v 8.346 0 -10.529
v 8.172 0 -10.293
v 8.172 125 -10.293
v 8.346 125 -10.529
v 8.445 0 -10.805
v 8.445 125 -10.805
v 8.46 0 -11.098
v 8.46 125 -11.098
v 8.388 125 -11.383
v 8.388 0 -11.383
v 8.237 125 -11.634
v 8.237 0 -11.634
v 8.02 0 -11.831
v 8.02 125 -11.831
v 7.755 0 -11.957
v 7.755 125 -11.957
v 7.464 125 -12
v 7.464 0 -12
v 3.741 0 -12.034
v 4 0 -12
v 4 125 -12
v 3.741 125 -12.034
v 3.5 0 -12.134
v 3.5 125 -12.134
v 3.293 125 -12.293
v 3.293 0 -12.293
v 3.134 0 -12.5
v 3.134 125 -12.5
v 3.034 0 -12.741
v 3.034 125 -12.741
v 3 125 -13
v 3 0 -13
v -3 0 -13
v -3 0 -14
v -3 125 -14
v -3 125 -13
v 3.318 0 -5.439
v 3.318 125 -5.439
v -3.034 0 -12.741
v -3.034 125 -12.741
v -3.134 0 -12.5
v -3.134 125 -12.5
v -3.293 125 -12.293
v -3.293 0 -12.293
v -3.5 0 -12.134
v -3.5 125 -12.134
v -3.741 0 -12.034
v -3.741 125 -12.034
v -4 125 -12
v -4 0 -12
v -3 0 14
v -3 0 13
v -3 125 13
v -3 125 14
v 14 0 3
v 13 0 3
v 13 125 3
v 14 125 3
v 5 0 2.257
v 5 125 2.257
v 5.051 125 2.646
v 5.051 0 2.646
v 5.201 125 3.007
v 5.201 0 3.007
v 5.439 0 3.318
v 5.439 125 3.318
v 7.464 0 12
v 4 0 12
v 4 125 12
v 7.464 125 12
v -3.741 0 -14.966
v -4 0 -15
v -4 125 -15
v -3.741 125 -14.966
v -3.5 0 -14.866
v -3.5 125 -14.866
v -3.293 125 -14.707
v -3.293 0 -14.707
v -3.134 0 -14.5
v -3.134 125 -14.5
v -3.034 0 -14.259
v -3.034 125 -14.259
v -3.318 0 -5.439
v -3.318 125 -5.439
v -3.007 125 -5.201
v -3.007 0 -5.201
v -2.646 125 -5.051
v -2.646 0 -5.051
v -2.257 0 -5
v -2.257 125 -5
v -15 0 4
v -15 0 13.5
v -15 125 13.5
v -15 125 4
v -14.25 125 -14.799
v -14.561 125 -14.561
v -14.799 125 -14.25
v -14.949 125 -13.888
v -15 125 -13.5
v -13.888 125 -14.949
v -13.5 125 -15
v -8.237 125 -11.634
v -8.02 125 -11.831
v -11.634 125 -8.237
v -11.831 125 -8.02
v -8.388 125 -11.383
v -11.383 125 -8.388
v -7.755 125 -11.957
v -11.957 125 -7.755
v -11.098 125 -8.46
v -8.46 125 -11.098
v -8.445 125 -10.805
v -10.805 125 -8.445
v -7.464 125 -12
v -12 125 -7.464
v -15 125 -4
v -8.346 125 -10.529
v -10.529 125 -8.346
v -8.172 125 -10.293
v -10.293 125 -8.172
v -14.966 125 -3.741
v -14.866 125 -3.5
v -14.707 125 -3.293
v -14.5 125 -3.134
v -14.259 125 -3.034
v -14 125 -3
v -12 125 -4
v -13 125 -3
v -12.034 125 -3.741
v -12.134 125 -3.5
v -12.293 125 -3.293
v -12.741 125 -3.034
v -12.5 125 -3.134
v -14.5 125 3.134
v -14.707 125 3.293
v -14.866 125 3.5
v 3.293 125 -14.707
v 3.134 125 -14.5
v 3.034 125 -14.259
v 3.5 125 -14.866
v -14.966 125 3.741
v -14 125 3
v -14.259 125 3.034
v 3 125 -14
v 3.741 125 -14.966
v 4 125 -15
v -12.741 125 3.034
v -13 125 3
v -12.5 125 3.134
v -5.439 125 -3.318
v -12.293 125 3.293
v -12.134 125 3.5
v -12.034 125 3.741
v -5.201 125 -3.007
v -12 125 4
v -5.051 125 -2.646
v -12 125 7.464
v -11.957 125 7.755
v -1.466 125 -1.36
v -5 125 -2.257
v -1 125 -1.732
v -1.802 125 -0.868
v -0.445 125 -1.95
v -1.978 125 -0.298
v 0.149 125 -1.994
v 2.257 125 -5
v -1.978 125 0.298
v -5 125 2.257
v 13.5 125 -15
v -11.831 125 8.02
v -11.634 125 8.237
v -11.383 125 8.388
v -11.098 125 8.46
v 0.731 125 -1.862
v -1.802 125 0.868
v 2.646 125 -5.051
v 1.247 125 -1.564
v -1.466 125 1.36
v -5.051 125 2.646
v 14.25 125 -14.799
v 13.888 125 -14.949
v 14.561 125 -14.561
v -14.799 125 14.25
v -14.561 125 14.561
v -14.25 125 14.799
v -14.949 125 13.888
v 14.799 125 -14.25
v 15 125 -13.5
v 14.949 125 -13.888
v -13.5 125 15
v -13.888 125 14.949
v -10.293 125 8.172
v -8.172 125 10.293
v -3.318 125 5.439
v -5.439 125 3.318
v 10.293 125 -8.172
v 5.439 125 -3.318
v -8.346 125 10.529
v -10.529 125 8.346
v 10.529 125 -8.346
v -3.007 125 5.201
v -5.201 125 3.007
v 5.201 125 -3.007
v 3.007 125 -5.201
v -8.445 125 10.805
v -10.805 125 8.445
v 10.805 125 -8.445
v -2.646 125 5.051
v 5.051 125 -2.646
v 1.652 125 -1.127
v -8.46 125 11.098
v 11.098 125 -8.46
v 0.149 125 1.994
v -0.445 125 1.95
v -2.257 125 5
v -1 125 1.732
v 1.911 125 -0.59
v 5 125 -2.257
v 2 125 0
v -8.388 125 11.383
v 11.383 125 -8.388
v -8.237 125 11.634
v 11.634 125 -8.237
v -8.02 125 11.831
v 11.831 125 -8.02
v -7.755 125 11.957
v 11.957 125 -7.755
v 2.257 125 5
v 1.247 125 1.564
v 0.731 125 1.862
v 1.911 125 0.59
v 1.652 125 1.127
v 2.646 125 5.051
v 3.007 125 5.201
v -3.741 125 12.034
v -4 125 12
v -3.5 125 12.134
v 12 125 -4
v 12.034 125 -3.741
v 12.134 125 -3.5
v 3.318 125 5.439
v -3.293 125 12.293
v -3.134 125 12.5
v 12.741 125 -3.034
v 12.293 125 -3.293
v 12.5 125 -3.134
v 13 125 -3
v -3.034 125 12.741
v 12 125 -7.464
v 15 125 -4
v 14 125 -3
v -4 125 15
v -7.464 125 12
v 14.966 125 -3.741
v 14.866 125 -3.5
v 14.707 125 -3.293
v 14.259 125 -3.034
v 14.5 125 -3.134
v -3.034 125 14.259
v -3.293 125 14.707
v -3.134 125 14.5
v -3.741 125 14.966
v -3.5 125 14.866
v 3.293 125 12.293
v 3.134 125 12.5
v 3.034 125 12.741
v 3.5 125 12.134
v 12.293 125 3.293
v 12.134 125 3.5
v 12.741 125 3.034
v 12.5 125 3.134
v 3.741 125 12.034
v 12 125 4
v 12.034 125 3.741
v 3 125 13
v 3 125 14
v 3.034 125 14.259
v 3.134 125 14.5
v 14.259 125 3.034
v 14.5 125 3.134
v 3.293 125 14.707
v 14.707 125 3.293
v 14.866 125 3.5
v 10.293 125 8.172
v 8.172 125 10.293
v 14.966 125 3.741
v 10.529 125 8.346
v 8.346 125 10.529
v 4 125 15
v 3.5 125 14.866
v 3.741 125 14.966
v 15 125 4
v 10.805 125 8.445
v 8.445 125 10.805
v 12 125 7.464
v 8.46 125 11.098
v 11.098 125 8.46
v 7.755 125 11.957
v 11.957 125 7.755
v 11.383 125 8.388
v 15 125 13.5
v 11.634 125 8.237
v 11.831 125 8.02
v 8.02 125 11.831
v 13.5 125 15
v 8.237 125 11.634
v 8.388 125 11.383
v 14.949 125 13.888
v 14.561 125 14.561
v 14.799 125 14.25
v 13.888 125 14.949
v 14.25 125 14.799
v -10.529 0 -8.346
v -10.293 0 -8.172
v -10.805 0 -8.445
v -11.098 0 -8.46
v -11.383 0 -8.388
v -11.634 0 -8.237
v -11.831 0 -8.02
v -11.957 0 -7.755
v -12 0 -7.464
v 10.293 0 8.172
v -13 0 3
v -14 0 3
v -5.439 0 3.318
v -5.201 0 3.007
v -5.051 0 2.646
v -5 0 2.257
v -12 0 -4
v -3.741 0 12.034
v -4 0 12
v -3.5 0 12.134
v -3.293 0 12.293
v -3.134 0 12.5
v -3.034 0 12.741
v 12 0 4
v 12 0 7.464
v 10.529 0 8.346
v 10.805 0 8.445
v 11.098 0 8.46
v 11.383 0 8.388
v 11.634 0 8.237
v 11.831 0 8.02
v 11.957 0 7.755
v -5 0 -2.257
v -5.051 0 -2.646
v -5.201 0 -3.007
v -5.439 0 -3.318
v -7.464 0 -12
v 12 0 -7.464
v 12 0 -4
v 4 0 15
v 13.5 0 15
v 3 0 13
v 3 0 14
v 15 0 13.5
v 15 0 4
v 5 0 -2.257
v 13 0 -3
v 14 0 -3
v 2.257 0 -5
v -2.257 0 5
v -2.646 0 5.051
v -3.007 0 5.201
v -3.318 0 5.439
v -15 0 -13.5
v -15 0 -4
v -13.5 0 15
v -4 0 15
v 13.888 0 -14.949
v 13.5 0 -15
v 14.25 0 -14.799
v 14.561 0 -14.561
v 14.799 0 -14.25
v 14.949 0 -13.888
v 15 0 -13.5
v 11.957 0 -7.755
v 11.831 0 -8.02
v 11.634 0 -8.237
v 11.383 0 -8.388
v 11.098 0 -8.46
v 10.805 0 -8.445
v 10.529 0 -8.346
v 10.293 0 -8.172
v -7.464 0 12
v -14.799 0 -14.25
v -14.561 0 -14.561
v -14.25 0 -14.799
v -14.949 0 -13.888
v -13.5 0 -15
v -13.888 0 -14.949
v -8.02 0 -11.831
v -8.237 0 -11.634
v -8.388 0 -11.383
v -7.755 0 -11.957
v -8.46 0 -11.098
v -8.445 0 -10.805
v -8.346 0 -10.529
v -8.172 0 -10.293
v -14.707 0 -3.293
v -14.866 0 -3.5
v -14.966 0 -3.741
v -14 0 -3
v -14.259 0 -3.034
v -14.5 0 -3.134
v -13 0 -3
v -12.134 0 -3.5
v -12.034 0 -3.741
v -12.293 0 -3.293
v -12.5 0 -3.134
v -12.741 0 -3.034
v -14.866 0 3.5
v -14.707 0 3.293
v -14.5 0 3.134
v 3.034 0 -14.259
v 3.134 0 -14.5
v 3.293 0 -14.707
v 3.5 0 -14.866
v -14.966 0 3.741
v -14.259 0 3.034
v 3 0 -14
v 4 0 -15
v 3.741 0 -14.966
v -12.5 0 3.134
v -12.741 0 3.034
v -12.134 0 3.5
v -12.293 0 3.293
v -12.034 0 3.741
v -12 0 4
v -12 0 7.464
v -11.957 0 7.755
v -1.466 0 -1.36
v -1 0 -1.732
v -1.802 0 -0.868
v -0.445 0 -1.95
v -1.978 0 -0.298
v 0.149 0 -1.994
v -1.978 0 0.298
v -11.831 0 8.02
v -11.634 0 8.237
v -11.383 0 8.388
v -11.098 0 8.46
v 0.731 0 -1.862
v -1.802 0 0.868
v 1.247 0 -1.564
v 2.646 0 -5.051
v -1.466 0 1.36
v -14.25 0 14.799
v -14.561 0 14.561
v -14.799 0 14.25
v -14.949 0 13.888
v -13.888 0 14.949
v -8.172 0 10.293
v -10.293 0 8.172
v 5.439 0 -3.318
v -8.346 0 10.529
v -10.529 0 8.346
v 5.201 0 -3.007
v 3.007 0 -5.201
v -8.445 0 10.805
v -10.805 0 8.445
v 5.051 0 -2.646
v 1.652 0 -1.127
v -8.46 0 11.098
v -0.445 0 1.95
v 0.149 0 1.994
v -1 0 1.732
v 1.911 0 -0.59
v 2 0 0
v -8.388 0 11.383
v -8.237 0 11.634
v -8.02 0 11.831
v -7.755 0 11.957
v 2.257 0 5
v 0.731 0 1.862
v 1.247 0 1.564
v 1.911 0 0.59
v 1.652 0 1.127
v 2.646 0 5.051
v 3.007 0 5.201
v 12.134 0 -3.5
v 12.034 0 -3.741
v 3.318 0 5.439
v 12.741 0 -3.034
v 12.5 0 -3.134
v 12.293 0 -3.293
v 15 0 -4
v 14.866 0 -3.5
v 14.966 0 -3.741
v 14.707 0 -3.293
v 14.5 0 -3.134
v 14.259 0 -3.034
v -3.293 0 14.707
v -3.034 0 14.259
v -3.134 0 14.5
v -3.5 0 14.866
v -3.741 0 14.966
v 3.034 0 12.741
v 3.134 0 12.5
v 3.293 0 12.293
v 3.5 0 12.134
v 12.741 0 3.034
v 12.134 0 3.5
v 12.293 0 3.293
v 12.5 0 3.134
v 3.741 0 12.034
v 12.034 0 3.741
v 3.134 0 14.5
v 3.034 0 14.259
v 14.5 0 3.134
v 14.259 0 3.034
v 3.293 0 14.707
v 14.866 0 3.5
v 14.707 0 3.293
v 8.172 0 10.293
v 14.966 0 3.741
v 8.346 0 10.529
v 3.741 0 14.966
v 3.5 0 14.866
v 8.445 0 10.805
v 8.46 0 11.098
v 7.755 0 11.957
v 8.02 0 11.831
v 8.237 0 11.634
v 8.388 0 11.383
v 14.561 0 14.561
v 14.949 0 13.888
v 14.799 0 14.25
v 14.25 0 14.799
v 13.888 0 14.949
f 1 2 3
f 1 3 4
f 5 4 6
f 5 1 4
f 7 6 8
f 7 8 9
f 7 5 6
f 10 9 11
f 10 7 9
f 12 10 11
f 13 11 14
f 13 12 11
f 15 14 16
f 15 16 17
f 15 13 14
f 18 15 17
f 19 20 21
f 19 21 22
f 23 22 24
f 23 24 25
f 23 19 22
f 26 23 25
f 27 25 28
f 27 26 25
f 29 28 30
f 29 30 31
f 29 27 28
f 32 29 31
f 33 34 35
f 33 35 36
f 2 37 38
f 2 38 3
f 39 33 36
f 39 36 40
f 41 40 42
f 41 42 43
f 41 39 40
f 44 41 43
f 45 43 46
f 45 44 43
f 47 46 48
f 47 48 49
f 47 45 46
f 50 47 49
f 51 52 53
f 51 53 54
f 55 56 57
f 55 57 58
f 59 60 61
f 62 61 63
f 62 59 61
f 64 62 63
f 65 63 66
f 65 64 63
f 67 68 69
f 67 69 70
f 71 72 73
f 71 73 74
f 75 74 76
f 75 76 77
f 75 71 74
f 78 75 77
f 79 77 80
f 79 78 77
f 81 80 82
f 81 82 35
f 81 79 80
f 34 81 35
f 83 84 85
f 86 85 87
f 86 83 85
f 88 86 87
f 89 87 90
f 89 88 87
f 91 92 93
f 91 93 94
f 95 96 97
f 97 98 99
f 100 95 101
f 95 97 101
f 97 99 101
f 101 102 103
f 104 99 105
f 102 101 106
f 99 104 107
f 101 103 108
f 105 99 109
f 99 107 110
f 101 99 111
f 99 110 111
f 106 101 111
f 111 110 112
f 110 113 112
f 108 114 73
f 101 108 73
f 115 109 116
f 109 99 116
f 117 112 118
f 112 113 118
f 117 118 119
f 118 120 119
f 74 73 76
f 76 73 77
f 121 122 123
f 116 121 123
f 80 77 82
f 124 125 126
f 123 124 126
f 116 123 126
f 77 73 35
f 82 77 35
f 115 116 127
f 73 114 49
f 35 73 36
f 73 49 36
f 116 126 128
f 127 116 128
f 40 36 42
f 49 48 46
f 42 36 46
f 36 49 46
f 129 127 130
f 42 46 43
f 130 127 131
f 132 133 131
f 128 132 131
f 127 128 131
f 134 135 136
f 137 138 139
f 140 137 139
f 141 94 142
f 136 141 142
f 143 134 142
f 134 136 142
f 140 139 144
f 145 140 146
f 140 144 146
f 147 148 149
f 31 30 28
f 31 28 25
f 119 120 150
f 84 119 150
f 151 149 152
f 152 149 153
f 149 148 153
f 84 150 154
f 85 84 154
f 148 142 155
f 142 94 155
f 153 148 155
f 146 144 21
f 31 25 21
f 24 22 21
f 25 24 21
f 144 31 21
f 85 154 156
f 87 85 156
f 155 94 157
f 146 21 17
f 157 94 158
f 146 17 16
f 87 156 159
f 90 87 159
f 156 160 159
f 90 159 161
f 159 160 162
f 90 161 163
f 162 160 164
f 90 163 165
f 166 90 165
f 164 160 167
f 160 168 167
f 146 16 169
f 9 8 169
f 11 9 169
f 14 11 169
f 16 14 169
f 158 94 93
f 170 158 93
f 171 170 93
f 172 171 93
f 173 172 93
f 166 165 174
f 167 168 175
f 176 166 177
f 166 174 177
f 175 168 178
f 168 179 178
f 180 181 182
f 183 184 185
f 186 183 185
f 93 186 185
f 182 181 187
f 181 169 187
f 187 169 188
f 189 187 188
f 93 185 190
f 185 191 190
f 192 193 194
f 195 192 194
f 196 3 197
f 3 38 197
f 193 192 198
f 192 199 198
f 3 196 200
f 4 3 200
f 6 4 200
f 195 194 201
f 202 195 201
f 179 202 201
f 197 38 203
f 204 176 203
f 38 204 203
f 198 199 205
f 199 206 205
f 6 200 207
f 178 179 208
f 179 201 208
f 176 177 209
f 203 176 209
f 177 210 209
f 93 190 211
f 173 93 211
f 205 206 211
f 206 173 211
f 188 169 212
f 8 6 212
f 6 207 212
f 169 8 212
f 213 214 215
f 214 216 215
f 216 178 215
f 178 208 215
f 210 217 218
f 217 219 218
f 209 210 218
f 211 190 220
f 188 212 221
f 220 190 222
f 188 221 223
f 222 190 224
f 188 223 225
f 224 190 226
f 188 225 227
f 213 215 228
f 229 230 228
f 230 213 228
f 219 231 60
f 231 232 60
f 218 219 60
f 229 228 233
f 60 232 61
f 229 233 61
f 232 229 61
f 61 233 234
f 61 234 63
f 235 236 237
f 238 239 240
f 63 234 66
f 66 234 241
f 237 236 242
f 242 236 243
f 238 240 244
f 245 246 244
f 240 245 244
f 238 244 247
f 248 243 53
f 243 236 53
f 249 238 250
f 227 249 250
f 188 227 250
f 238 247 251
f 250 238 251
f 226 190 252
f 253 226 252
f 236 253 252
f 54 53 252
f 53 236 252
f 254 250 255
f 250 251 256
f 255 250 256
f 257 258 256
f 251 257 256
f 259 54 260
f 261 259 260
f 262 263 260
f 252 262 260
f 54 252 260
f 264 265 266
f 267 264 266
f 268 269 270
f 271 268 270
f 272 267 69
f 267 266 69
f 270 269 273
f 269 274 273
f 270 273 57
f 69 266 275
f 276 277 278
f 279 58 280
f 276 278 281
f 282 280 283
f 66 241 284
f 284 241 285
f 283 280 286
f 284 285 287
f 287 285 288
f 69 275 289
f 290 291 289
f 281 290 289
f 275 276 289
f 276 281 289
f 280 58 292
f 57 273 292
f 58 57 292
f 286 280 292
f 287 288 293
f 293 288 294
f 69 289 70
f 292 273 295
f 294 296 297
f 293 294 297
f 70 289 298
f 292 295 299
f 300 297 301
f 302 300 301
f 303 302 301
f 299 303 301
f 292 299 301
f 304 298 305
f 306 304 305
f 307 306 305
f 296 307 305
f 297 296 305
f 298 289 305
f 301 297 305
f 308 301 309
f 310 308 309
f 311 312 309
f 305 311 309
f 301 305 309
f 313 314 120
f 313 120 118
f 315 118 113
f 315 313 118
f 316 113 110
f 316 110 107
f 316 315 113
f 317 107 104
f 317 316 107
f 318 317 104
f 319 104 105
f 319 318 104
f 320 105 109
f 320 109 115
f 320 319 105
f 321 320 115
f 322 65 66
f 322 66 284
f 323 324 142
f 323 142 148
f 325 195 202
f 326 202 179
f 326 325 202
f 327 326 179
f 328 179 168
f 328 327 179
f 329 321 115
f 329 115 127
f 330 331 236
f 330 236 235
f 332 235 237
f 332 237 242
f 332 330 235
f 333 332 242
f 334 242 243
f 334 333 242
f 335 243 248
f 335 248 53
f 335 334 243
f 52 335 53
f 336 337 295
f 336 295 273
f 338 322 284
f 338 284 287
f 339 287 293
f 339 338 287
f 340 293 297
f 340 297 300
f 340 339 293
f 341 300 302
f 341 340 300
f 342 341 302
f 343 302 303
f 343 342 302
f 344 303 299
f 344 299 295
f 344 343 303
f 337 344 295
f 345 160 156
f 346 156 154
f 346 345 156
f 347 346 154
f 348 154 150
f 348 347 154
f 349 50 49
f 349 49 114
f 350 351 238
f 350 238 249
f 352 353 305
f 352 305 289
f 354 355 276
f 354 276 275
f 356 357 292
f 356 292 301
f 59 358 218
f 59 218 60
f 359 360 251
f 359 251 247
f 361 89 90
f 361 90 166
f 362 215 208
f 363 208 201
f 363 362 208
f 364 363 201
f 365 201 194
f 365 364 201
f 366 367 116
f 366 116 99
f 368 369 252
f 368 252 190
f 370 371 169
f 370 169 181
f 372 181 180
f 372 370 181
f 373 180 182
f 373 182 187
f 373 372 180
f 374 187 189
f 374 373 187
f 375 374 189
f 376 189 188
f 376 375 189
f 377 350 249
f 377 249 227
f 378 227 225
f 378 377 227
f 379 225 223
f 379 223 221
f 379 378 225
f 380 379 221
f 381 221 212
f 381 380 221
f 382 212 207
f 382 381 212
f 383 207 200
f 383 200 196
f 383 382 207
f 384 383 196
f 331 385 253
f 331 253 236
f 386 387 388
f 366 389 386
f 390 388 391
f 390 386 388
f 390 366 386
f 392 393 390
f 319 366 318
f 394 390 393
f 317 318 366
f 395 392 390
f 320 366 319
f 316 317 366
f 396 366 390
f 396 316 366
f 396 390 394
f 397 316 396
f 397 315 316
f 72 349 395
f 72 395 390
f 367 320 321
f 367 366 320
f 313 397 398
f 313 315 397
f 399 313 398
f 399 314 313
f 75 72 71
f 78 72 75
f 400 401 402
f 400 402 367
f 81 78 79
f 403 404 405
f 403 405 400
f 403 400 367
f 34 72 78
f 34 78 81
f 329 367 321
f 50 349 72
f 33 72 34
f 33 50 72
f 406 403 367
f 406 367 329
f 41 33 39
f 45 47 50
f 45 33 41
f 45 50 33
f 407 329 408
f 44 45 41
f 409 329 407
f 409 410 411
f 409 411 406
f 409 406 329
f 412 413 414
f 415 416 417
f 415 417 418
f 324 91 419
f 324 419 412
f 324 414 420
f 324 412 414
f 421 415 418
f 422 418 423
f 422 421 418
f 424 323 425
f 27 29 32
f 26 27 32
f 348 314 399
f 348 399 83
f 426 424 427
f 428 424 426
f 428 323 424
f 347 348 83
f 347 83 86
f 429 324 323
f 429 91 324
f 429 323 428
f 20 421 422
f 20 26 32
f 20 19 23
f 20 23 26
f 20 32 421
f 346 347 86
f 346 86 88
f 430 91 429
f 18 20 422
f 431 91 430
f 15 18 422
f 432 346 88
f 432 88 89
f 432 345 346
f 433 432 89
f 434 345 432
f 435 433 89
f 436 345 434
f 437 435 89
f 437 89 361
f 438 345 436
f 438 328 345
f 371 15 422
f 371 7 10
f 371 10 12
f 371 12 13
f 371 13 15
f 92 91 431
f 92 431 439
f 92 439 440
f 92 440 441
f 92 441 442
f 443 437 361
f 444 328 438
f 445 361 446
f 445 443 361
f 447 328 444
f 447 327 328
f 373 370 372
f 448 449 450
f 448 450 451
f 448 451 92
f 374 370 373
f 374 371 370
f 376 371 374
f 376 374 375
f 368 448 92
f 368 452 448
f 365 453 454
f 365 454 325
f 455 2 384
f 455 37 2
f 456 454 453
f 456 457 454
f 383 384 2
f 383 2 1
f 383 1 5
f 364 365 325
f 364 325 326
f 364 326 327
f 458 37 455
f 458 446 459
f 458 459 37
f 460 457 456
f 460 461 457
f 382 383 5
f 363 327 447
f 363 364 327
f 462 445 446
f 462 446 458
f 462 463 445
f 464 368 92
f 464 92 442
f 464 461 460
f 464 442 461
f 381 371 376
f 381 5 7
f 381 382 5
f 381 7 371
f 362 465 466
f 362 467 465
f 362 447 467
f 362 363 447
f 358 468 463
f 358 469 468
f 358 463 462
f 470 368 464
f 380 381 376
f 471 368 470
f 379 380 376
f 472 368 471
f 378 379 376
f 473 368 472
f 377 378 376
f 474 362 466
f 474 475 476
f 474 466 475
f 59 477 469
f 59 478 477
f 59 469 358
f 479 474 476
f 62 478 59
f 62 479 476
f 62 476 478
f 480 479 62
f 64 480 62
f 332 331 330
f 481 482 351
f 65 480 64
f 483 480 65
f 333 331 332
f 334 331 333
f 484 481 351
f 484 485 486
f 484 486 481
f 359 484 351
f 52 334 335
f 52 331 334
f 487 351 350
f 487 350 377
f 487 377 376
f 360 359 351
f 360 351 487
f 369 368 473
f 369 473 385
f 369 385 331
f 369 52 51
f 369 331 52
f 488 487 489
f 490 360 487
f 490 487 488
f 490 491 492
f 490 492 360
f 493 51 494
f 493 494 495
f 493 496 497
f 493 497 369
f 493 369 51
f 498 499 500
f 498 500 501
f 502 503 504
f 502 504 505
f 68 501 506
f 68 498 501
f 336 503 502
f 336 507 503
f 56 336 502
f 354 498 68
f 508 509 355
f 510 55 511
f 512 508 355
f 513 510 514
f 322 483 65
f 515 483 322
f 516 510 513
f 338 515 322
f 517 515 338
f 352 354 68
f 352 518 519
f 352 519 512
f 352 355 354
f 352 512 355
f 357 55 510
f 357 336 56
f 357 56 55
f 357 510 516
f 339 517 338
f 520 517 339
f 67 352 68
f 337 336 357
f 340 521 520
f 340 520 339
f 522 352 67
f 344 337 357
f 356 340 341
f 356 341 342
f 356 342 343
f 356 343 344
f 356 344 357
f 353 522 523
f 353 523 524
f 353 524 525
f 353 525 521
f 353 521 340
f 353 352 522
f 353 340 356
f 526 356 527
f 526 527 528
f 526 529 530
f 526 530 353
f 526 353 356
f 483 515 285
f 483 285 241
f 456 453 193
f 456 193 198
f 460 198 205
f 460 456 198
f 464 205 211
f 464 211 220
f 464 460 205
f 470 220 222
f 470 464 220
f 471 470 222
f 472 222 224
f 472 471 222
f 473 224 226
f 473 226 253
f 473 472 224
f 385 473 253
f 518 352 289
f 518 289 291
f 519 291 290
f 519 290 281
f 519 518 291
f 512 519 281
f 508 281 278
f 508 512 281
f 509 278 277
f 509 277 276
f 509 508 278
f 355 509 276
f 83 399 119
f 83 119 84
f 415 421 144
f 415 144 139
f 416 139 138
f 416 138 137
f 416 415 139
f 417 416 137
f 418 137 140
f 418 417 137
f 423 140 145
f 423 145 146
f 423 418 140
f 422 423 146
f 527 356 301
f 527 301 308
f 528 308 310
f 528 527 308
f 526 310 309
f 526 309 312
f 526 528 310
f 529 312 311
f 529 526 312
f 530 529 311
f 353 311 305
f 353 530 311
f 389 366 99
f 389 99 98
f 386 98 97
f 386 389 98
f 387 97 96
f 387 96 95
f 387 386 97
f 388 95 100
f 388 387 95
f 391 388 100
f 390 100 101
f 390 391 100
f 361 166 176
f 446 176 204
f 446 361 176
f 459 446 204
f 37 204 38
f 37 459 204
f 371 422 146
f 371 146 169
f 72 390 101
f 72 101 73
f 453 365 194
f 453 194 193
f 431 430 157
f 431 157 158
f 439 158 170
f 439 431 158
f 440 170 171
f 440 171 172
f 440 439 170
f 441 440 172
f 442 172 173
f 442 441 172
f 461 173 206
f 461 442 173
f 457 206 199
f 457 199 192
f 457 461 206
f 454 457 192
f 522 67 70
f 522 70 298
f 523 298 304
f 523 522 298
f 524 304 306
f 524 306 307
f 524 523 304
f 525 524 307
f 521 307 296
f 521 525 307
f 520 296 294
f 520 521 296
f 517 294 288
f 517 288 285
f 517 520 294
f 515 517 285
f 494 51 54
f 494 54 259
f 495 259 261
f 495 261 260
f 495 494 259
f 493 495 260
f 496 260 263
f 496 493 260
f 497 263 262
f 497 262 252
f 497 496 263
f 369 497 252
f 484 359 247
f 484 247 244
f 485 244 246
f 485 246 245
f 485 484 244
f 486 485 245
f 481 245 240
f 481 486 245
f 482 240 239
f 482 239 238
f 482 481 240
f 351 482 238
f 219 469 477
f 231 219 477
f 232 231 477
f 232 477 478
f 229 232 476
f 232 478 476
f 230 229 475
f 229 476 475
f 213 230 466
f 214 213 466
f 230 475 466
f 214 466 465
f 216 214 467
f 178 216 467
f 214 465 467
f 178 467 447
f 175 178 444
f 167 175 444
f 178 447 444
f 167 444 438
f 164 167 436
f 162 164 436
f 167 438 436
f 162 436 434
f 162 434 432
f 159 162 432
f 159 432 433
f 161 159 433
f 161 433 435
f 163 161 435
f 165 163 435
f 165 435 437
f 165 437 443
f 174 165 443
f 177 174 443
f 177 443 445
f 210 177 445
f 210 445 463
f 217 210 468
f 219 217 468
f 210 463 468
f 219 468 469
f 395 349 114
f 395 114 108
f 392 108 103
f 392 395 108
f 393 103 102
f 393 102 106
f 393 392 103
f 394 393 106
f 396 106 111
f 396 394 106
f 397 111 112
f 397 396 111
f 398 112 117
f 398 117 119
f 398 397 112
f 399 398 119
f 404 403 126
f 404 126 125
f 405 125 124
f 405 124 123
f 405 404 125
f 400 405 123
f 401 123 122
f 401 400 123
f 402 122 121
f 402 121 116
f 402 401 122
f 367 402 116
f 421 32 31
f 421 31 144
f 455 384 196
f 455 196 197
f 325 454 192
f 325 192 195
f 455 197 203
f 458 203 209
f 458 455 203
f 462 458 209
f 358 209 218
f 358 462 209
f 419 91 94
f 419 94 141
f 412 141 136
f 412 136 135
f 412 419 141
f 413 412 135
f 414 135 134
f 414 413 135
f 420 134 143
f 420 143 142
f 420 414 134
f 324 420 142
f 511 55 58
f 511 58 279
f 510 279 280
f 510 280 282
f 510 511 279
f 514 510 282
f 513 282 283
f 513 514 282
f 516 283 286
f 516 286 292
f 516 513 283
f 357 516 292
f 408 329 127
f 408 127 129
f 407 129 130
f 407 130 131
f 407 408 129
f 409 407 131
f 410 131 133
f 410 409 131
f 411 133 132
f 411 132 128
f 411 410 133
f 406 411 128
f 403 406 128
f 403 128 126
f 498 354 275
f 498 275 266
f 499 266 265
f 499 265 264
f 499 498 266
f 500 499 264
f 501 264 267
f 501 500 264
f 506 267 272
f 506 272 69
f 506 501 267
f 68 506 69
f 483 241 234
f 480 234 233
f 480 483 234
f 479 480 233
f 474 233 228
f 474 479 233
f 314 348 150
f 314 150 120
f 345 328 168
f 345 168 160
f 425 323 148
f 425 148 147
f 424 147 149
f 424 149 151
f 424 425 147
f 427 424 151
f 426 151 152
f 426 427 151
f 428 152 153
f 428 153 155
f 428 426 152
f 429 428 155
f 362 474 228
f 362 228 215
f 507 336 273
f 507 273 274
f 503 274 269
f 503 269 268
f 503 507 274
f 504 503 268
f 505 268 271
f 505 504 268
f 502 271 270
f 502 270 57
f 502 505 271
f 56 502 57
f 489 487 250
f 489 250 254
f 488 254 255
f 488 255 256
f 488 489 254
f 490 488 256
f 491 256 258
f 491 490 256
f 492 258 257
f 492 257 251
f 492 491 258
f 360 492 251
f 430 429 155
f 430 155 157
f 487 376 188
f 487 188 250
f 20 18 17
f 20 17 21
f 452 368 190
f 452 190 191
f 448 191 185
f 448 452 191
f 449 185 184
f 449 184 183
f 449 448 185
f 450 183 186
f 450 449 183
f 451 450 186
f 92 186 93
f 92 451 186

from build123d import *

# Parameters (mm, degrees)
F0_R     = 2
F1_DEPTH = 125


with BuildPart() as f1:
    # F0 (on Front) → F1 (new body)
    with BuildSketch(Plane.XZ):
        with BuildLine():
            ThreePointArc((15, 13.5), (14.56066, 14.56066), (13.5, 15))
            Line((13.5, 15), (4, 15))
            ThreePointArc((4, 15), (3.292893, 14.707107), (3, 14))
            Line((3, 14), (3, 13))
            ThreePointArc((3, 13), (3.292893, 12.292893), (4, 12))
            Line((4, 12), (7.464466, 12))
            ThreePointArc((7.464466, 12), (8.388346, 11.382683), (8.171573, 10.292893))
            Line((8.171573, 10.292893), (3.318019, 5.43934))
            ThreePointArc((3.318019, 5.43934), (2.831384, 5.114181), (2.257359, 5))
            Line((2.257359, 5), (-2.257359, 5))
            ThreePointArc((-2.257359, 5), (-2.831384, 5.114181), (-3.318019, 5.43934))
            Line((-3.318019, 5.43934), (-8.171573, 10.292893))
            ThreePointArc((-8.171573, 10.292893), (-8.388346, 11.382683), (-7.464466, 12))
            Line((-7.464466, 12), (-4, 12))
            ThreePointArc((-4, 12), (-3.292893, 12.292893), (-3, 13))
            Line((-3, 13), (-3, 14))
            ThreePointArc((-3, 14), (-3.292893, 14.707107), (-4, 15))
            Line((-4, 15), (-13.5, 15))
            ThreePointArc((-13.5, 15), (-14.56066, 14.56066), (-15, 13.5))
            Line((-15, 13.5), (-15, 4))
            ThreePointArc((-15, 4), (-14.707107, 3.292893), (-14, 3))
            Line((-14, 3), (-13, 3))
            ThreePointArc((-13, 3), (-12.292893, 3.292893), (-12, 4))
            Line((-12, 4), (-12, 7.464466))
            ThreePointArc((-12, 7.464466), (-11.382683, 8.388346), (-10.292893, 8.171573))
            Line((-10.292893, 8.171573), (-5.43934, 3.318019))
            ThreePointArc((-5.43934, 3.318019), (-5.114181, 2.831384), (-5, 2.257359))
            Line((-5, 2.257359), (-5, -2.257359))
            ThreePointArc((-5, -2.257359), (-5.114181, -2.831384), (-5.43934, -3.318019))
            Line((-5.43934, -3.318019), (-10.292893, -8.171573))
            ThreePointArc((-10.292893, -8.171573), (-11.382683, -8.388346), (-12, -7.464466))
            Line((-12, -7.464466), (-12, -4))
            ThreePointArc((-12, -4), (-12.292893, -3.292893), (-13, -3))
            Line((-13, -3), (-14, -3))
            ThreePointArc((-14, -3), (-14.707107, -3.292893), (-15, -4))
            Line((-15, -4), (-15, -13.5))
            ThreePointArc((-15, -13.5), (-14.56066, -14.56066), (-13.5, -15))
            Line((-13.5, -15), (-4, -15))
            ThreePointArc((-4, -15), (-3.292893, -14.707107), (-3, -14))
            Line((-3, -14), (-3, -13))
            ThreePointArc((-3, -13), (-3.292893, -12.292893), (-4, -12))
            Line((-4, -12), (-7.464466, -12))
            ThreePointArc((-7.464466, -12), (-8.388346, -11.382683), (-8.171573, -10.292893))
            Line((-8.171573, -10.292893), (-3.318019, -5.43934))
            ThreePointArc((-3.318019, -5.43934), (-2.831384, -5.114181), (-2.257359, -5))
            Line((-2.257359, -5), (2.257359, -5))
            ThreePointArc((2.257359, -5), (2.831384, -5.114181), (3.318019, -5.43934))
            Line((3.318019, -5.43934), (8.171573, -10.292893))
            ThreePointArc((8.171573, -10.292893), (8.388346, -11.382683), (7.464466, -12))
            Line((7.464466, -12), (4, -12))
            ThreePointArc((4, -12), (3.292893, -12.292893), (3, -13))
            Line((3, -13), (3, -14))
            ThreePointArc((3, -14), (3.292893, -14.707107), (4, -15))
            Line((4, -15), (13.5, -15))
            ThreePointArc((13.5, -15), (14.56066, -14.56066), (15, -13.5))
            Line((15, -13.5), (15, -4))
            ThreePointArc((15, -4), (14.707107, -3.292893), (14, -3))
            Line((14, -3), (13, -3))
            ThreePointArc((13, -3), (12.292893, -3.292893), (12, -4))
            Line((12, -4), (12, -7.464466))
            ThreePointArc((12, -7.464466), (11.382683, -8.388346), (10.292893, -8.171573))
            Line((10.292893, -8.171573), (5.43934, -3.318019))
            ThreePointArc((5.43934, -3.318019), (5.114181, -2.831384), (5, -2.257359))
            Line((5, -2.257359), (5, 2.257359))
            ThreePointArc((5, 2.257359), (5.114181, 2.831384), (5.43934, 3.318019))
            Line((5.43934, 3.318019), (10.292893, 8.171573))
            ThreePointArc((10.292893, 8.171573), (11.382683, 8.388346), (12, 7.464466))
            Line((12, 7.464466), (12, 4))
            ThreePointArc((12, 4), (12.292893, 3.292893), (13, 3))
            Line((13, 3), (14, 3))
            ThreePointArc((14, 3), (14.707107, 3.292893), (15, 4))
            Line((15, 4), (15, 13.5))
        make_face()
        Circle(F0_R, mode=Mode.SUBTRACT)
    extrude(amount=-F1_DEPTH)


solid = f1.part
